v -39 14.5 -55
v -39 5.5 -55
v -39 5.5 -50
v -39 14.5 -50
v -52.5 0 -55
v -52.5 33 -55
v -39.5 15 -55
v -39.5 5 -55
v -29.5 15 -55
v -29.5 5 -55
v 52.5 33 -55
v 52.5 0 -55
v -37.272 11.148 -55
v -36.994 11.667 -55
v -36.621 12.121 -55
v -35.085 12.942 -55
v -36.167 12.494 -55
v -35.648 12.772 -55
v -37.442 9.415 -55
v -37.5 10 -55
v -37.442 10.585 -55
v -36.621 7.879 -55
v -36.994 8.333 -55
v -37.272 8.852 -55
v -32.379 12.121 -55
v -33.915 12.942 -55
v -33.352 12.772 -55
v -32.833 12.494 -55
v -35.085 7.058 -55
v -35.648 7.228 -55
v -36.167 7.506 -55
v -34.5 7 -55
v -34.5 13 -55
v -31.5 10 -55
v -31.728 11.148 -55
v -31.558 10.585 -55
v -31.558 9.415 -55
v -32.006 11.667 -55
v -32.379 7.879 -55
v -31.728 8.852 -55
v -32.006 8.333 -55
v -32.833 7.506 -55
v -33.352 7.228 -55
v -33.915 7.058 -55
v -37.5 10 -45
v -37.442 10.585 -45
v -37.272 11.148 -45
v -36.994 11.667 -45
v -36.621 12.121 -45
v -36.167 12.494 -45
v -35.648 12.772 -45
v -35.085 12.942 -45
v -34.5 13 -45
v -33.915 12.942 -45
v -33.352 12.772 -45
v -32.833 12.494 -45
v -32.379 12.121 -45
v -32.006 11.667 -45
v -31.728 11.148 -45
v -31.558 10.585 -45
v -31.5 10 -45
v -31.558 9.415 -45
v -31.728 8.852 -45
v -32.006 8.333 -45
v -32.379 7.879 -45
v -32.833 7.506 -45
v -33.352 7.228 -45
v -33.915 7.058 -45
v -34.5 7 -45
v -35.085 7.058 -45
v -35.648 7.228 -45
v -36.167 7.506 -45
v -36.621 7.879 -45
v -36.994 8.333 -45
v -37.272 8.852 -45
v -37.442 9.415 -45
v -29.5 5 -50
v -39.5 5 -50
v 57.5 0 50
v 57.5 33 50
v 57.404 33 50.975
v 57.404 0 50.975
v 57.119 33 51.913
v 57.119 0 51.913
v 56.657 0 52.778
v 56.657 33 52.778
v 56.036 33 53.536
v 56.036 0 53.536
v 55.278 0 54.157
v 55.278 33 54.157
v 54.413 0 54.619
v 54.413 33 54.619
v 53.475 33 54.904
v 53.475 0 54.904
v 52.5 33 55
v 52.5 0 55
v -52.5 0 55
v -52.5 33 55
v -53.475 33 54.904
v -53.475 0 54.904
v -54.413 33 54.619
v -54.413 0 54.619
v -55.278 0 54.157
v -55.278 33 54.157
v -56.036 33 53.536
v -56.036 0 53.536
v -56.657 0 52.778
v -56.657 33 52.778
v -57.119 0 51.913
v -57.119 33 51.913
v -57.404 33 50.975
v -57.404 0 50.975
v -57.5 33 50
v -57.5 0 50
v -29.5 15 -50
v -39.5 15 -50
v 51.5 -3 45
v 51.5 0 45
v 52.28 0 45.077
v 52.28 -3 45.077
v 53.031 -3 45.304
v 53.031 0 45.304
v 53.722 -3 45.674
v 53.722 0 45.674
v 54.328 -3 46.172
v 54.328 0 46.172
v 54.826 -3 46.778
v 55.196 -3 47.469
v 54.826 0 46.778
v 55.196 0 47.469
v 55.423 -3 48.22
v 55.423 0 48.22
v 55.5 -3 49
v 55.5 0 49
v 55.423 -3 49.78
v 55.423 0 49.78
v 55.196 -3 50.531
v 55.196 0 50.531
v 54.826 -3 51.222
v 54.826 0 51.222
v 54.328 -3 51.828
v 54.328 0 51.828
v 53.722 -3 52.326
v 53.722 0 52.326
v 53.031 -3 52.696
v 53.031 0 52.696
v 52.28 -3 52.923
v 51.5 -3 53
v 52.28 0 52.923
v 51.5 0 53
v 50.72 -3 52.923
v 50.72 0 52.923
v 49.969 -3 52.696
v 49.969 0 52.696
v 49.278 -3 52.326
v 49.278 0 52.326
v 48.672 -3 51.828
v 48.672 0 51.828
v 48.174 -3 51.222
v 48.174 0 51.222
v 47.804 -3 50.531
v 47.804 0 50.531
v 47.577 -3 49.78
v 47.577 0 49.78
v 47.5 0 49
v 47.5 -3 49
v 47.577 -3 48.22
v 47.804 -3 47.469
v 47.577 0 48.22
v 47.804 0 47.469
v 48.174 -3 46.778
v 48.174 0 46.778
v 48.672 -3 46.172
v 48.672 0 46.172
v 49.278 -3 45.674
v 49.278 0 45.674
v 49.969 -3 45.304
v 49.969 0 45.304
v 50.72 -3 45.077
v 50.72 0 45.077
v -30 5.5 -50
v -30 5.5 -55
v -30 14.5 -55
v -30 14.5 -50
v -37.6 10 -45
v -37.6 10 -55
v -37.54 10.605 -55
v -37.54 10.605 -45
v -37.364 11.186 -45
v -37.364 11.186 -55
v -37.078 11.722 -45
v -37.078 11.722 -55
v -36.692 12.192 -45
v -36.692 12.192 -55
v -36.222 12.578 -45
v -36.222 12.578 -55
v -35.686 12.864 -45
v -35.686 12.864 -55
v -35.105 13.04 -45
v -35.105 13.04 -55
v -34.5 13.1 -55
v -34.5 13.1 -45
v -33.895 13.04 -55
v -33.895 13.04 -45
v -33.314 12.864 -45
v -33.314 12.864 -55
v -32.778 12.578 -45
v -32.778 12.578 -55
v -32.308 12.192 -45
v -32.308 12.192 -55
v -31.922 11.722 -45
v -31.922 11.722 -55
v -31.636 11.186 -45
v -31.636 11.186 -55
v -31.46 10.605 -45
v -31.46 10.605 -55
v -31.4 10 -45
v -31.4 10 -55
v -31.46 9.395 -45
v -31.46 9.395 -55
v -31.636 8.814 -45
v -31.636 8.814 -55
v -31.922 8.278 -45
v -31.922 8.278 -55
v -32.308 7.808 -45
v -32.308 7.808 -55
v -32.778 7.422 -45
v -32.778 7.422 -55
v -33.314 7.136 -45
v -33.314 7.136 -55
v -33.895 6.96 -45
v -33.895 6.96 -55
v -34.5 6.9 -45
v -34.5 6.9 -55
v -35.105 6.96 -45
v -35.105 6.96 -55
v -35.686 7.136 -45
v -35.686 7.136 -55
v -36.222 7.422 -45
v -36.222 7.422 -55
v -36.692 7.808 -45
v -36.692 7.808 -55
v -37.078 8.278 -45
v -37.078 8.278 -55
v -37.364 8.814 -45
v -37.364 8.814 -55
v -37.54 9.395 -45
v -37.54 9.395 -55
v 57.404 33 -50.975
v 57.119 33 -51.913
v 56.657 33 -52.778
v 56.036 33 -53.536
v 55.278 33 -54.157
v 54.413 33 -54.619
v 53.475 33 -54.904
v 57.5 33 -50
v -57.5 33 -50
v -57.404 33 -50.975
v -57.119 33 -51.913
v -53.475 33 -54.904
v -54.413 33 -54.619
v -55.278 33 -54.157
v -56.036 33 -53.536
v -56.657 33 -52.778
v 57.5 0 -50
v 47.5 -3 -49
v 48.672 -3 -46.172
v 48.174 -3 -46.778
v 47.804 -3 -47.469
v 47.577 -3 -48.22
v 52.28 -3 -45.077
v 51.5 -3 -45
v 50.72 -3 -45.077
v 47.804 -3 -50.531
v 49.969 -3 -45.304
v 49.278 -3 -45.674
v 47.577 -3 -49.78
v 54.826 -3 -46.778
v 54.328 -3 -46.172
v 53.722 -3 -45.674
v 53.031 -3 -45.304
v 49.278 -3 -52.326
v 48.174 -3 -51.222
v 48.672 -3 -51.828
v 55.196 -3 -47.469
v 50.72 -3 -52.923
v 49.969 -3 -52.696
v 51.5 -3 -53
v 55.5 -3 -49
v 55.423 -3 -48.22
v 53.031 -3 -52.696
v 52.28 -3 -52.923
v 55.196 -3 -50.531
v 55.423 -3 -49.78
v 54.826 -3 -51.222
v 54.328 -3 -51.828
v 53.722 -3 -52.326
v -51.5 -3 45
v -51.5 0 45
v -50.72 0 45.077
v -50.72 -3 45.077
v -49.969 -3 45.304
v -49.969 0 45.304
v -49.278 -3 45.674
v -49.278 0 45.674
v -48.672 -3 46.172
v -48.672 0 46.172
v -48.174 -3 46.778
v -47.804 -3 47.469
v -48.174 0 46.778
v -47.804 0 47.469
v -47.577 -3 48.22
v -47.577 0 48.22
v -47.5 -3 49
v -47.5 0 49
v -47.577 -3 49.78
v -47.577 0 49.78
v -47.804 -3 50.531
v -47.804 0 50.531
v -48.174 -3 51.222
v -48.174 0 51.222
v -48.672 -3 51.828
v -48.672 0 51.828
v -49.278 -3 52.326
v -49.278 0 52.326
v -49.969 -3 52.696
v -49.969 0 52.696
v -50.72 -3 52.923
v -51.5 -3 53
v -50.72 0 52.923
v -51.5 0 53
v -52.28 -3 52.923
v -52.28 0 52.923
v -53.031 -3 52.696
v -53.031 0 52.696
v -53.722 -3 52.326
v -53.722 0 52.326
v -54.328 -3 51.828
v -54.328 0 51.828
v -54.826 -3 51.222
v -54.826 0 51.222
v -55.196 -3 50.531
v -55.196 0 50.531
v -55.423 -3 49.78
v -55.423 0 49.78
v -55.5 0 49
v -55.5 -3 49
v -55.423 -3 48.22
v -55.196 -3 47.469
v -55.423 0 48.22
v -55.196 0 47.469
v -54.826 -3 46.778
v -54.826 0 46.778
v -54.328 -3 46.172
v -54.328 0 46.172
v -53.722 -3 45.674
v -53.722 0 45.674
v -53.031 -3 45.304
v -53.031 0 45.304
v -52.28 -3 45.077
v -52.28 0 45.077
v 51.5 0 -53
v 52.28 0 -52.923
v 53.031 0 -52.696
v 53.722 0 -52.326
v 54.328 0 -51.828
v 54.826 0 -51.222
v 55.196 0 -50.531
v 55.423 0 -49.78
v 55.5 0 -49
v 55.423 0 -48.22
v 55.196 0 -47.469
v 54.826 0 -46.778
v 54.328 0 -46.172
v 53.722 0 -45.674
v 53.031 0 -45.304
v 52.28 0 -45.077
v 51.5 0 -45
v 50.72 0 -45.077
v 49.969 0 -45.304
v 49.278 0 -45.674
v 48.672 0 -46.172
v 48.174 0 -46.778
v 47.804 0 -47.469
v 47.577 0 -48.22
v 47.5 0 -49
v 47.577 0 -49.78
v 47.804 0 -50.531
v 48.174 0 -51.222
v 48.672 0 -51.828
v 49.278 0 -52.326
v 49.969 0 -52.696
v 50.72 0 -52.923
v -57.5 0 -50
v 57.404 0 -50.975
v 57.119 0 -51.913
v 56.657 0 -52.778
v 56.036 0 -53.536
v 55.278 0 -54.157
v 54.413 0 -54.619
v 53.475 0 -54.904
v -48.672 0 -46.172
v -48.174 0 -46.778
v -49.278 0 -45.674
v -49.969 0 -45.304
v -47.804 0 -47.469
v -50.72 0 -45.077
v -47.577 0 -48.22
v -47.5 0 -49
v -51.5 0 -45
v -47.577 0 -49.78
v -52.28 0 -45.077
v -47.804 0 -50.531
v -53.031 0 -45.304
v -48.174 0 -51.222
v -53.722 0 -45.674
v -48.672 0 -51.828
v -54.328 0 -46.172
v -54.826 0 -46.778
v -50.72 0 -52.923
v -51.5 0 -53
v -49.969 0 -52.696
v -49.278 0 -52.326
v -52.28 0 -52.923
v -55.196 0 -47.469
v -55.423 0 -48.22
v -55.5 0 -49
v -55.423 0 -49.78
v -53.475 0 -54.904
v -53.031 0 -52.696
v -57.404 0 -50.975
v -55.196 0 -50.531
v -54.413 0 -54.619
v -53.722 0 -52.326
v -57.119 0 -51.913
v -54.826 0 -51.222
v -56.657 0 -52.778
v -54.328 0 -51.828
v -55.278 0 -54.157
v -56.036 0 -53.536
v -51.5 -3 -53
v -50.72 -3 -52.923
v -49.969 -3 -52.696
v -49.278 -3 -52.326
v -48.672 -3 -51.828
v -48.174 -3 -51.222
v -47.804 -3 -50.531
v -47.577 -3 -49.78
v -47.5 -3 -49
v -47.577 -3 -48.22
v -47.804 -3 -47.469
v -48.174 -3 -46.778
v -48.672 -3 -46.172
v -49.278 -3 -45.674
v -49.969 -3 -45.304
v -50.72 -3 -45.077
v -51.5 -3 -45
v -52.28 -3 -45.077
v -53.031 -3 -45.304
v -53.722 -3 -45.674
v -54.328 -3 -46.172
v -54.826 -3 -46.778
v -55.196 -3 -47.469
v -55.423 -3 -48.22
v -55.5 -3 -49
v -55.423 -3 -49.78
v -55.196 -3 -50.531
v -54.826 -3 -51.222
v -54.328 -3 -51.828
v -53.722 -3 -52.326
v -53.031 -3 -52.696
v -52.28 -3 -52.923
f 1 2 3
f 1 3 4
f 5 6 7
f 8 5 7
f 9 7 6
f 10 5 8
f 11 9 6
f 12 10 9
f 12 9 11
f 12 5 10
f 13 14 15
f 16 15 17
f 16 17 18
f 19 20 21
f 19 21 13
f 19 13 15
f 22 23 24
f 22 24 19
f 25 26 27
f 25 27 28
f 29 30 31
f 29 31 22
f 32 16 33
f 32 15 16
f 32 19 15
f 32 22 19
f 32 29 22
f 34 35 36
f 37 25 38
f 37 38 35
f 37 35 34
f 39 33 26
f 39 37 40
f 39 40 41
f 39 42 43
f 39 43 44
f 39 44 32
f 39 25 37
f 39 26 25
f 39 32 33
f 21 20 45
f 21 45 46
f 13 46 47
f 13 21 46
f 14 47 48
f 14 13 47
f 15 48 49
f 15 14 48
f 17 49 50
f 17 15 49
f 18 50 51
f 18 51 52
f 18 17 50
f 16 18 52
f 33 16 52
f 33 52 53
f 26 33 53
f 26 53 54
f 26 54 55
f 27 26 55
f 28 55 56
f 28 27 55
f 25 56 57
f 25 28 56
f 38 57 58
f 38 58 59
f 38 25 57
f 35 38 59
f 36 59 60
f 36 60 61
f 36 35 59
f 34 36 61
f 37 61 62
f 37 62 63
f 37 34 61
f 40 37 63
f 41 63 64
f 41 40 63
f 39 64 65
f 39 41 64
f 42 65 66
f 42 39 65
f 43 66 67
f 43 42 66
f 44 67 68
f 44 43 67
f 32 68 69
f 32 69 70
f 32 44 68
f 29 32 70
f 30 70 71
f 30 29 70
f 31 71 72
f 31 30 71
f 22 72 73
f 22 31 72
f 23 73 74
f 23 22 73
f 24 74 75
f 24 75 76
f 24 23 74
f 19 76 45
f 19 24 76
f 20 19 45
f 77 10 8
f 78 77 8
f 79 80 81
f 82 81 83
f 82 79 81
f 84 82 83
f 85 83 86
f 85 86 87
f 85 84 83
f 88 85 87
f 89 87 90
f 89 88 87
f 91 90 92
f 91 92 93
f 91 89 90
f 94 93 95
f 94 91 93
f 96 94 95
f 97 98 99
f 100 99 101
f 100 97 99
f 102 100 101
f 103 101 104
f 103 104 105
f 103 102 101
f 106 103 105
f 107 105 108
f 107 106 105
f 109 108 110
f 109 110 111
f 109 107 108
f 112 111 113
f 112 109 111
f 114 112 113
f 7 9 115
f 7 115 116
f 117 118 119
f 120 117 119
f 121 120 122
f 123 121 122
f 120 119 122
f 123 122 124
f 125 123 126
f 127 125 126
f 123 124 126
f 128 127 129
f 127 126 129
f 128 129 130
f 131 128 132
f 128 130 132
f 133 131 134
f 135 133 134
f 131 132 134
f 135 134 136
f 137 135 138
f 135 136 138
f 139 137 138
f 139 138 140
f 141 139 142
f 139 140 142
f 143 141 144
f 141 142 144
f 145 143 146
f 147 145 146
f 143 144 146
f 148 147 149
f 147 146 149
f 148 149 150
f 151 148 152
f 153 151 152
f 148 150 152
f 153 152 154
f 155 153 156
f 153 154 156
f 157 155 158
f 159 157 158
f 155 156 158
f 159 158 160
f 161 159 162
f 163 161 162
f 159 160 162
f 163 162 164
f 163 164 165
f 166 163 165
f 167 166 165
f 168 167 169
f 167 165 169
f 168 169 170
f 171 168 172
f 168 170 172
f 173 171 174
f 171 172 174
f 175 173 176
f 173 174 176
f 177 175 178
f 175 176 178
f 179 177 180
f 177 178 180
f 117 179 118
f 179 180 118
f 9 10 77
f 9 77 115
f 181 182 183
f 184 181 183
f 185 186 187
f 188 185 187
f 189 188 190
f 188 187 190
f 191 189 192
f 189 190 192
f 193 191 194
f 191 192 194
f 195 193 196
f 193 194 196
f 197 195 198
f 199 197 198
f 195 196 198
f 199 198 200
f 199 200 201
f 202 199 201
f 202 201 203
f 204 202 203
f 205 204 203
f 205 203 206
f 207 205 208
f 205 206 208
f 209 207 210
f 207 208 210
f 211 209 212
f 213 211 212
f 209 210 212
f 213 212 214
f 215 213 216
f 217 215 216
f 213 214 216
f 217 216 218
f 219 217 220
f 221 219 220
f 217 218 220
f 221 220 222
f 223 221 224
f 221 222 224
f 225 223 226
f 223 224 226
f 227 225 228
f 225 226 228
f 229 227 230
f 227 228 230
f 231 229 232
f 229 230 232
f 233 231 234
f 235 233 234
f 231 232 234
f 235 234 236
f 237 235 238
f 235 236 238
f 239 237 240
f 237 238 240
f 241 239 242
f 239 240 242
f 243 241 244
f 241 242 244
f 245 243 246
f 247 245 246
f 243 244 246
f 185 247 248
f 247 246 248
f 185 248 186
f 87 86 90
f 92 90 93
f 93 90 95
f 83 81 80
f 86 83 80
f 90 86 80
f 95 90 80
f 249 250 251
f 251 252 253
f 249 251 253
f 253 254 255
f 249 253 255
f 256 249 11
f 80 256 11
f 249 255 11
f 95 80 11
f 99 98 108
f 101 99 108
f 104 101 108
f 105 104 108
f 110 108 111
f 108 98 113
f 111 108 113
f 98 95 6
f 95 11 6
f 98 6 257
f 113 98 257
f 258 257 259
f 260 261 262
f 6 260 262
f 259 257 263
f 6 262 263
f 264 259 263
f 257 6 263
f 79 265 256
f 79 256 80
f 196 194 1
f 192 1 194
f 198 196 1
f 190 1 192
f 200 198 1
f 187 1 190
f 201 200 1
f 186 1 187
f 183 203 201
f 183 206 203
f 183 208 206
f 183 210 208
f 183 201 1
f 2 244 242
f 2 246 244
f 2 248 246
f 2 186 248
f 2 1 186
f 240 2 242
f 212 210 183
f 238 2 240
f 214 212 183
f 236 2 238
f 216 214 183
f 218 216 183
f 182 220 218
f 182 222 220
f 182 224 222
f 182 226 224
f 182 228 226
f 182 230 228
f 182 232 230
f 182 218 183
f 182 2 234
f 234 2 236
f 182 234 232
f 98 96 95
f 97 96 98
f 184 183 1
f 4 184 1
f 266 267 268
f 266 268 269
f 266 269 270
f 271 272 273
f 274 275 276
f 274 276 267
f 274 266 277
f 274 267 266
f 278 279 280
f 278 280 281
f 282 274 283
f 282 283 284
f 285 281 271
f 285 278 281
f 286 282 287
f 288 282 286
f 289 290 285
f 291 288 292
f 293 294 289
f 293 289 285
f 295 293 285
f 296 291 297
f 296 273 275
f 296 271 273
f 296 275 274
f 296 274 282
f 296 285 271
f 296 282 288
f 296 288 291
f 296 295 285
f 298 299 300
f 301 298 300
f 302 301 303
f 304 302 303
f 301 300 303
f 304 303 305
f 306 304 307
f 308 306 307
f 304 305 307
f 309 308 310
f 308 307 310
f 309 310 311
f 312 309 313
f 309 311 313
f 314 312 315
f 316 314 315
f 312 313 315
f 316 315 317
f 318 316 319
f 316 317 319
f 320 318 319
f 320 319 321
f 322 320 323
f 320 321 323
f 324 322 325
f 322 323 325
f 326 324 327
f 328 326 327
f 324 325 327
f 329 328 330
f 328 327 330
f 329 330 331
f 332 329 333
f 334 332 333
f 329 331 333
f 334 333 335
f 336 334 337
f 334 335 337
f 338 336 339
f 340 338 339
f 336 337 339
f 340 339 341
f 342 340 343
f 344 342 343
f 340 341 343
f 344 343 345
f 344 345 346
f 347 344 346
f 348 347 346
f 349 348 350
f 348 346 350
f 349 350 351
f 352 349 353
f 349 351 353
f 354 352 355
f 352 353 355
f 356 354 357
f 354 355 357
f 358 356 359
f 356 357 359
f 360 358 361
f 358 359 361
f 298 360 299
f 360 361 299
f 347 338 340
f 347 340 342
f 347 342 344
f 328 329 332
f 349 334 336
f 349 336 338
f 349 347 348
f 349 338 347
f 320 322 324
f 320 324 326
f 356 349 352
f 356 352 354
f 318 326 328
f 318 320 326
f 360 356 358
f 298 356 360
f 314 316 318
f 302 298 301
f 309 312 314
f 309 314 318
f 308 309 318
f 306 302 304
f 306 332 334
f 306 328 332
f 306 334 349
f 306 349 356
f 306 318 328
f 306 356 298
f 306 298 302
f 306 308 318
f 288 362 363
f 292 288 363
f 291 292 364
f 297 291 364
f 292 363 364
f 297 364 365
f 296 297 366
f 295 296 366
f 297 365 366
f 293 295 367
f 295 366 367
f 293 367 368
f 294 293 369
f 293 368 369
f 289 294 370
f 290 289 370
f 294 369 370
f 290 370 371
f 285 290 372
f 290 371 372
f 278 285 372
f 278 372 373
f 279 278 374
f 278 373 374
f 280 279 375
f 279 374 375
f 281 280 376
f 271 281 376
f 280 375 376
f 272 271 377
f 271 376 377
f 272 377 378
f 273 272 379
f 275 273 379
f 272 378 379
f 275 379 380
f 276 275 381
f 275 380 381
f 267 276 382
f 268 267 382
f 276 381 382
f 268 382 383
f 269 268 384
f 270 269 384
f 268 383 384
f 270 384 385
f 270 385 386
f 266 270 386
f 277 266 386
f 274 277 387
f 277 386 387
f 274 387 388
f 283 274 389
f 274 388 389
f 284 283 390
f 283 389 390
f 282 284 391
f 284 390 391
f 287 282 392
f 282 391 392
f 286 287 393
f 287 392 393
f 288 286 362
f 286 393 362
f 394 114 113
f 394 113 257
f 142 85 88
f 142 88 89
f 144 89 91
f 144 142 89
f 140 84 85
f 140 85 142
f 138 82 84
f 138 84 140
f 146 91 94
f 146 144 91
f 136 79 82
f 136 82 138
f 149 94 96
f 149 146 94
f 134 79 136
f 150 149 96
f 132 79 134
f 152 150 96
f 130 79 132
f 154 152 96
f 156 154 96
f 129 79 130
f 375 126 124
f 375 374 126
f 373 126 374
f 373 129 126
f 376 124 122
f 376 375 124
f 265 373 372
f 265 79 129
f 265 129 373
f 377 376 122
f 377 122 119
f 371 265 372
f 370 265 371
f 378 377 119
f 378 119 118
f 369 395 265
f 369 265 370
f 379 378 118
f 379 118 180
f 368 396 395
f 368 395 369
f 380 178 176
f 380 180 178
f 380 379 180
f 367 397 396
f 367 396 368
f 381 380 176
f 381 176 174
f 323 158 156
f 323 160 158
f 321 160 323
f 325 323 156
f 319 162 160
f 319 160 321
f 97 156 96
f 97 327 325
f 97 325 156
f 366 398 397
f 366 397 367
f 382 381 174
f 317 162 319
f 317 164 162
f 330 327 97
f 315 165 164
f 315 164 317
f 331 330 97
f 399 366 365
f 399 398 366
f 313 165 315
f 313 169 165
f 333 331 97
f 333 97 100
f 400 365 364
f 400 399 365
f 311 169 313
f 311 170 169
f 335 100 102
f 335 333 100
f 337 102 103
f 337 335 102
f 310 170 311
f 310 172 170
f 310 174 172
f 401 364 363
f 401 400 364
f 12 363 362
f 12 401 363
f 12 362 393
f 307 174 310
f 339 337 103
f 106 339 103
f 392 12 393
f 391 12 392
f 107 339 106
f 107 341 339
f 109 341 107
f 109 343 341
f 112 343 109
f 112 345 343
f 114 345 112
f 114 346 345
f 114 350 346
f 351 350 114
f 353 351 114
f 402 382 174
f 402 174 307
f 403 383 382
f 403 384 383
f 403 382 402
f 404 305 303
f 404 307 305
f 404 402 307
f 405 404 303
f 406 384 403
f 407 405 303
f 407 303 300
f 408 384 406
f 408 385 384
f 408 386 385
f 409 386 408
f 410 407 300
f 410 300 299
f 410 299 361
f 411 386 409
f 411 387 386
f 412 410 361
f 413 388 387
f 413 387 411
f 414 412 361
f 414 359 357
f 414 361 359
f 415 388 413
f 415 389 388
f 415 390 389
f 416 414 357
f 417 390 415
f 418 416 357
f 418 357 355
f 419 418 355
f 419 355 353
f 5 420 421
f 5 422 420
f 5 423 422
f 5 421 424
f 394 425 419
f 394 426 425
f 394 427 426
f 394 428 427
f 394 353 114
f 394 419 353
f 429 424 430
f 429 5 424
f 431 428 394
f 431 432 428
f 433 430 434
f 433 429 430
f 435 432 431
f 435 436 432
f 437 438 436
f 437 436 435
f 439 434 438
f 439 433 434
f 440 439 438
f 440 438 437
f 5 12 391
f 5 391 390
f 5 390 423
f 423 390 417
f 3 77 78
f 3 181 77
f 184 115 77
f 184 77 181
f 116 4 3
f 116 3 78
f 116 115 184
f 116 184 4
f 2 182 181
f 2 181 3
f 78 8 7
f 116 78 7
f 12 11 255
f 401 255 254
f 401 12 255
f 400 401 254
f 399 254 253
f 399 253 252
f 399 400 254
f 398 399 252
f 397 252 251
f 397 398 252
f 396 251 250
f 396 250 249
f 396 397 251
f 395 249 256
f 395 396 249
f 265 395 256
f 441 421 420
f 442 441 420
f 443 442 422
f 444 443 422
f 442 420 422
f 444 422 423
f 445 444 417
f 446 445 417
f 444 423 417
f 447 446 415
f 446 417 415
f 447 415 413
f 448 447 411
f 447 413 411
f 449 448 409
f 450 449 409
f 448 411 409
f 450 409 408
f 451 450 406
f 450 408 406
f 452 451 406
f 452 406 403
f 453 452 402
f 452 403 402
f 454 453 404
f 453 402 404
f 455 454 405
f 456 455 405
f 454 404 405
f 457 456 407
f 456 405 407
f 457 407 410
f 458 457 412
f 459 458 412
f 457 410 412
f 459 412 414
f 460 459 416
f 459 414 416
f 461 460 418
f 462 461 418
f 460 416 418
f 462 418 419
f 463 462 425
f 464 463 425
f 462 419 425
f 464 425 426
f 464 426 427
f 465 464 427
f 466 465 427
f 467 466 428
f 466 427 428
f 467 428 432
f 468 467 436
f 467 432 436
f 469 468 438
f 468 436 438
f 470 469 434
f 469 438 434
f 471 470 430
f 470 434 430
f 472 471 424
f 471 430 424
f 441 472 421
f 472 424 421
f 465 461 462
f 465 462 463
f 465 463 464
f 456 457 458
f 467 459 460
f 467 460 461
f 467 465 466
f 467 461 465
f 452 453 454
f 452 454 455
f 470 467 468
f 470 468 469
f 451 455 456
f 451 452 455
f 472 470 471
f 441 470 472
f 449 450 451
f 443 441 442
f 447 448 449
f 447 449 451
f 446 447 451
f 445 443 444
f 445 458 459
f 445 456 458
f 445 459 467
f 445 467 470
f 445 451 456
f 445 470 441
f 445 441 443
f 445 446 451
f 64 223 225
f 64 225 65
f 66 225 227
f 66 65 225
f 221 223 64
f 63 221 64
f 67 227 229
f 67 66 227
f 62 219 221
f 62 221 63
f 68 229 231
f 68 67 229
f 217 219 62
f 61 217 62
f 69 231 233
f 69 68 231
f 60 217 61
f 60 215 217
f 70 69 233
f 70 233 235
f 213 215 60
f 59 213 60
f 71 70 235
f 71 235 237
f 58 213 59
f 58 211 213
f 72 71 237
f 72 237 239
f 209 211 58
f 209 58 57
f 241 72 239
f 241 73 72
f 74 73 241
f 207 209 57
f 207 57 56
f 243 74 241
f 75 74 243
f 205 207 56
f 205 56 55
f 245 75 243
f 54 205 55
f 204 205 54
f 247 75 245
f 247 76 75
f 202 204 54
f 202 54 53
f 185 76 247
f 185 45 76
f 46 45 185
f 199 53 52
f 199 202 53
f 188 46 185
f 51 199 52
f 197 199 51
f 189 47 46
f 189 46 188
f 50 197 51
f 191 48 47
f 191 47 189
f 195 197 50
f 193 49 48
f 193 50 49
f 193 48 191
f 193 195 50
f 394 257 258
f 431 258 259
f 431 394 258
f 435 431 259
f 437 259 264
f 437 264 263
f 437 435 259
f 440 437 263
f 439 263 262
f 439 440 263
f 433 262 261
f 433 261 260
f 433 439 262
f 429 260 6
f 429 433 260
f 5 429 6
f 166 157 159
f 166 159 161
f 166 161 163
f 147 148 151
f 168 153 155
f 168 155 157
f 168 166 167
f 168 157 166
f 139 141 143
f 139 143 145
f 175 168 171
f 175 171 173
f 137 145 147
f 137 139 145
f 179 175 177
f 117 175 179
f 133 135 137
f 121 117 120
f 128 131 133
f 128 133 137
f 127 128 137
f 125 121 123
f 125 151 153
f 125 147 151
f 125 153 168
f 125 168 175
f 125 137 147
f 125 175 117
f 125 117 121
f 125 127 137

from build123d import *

# Parameters (mm, degrees)
EXTRUDE_1_DEPTH     = 33
SKETCH_2_R          = 4
EXTRUDE_2_DEPTH     = 3
SKETCH_3_W          = 10
SKETCH_3_H          = 10
SKETCH_3_W_2        = 9
SKETCH_3_H_2        = 9
CUT_EXTRUDE_1_DEPTH = 5
SKETCH_4_R          = 3.1
SKETCH_4_R_2        = 3
CUT_EXTRUDE_2_DEPTH = 10


with BuildPart() as part:
    # 草图1 → 凸台-拉伸1 (new body)
    with BuildSketch(Plane(origin=(0, 0, 0), x_dir=(1, 0, 0), z_dir=(0, 1, 0))):
        with BuildLine():
            Line((-52.5, 55), (52.5, 55))
            ThreePointArc((52.5, 55), (56.035533906, 53.535533906), (57.5, 50))
            Line((57.5, 50), (57.5, -50))
            ThreePointArc((57.5, -50), (56.035533906, -53.535533906), (52.5, -55))
            Line((52.5, -55), (-52.5, -55))
            ThreePointArc((-52.5, -55), (-56.035533906, -53.535533906), (-57.5, -50))
            Line((-57.5, -50), (-57.5, 50))
            ThreePointArc((-57.5, 50), (-56.035533906, 53.535533906), (-52.5, 55))
        make_face()
    extrude(amount=EXTRUDE_1_DEPTH)

    # 草图2 → 凸台-拉伸2 (add)
    with BuildSketch(Plane.XZ):
        with Locations(Location((-51.5, 49, 0), (0, 0, 270))):
            Circle(SKETCH_2_R)
        with Locations(Location((51.5, 49, 0), (0, 0, 270))):
            Circle(SKETCH_2_R)
        with Locations(Location((-51.5, -49, 0), (0, 0, 270))):
            Circle(SKETCH_2_R)
        with Locations(Location((51.5, -49, 0), (0, 0, 270))):
            Circle(SKETCH_2_R)
    extrude(amount=EXTRUDE_2_DEPTH)

    # 草图3 → 切除-拉伸1 (cut)
    with BuildSketch(Plane(origin=(0, 0, -55), x_dir=(-1, 0, 0), z_dir=(0, 0, -1))):
        with Locations((34.5, 10)):
            Rectangle(SKETCH_3_W, SKETCH_3_H)
        with Locations((34.5, 10)):
            Rectangle(SKETCH_3_W_2, SKETCH_3_H_2, mode=Mode.SUBTRACT)
    extrude(amount=-CUT_EXTRUDE_1_DEPTH, mode=Mode.SUBTRACT)

    # 草图4 → 切除-拉伸2 (cut)
    with BuildSketch(Plane(origin=(0, 0, -55), x_dir=(-1, 0, 0), z_dir=(0, 0, -1))):
        with Locations((34.5, 10)):
            Circle(SKETCH_4_R)
        with Locations((34.5, 10)):
            Circle(SKETCH_4_R_2, mode=Mode.SUBTRACT)
    extrude(amount=-CUT_EXTRUDE_2_DEPTH, mode=Mode.SUBTRACT)


solid = part.part
